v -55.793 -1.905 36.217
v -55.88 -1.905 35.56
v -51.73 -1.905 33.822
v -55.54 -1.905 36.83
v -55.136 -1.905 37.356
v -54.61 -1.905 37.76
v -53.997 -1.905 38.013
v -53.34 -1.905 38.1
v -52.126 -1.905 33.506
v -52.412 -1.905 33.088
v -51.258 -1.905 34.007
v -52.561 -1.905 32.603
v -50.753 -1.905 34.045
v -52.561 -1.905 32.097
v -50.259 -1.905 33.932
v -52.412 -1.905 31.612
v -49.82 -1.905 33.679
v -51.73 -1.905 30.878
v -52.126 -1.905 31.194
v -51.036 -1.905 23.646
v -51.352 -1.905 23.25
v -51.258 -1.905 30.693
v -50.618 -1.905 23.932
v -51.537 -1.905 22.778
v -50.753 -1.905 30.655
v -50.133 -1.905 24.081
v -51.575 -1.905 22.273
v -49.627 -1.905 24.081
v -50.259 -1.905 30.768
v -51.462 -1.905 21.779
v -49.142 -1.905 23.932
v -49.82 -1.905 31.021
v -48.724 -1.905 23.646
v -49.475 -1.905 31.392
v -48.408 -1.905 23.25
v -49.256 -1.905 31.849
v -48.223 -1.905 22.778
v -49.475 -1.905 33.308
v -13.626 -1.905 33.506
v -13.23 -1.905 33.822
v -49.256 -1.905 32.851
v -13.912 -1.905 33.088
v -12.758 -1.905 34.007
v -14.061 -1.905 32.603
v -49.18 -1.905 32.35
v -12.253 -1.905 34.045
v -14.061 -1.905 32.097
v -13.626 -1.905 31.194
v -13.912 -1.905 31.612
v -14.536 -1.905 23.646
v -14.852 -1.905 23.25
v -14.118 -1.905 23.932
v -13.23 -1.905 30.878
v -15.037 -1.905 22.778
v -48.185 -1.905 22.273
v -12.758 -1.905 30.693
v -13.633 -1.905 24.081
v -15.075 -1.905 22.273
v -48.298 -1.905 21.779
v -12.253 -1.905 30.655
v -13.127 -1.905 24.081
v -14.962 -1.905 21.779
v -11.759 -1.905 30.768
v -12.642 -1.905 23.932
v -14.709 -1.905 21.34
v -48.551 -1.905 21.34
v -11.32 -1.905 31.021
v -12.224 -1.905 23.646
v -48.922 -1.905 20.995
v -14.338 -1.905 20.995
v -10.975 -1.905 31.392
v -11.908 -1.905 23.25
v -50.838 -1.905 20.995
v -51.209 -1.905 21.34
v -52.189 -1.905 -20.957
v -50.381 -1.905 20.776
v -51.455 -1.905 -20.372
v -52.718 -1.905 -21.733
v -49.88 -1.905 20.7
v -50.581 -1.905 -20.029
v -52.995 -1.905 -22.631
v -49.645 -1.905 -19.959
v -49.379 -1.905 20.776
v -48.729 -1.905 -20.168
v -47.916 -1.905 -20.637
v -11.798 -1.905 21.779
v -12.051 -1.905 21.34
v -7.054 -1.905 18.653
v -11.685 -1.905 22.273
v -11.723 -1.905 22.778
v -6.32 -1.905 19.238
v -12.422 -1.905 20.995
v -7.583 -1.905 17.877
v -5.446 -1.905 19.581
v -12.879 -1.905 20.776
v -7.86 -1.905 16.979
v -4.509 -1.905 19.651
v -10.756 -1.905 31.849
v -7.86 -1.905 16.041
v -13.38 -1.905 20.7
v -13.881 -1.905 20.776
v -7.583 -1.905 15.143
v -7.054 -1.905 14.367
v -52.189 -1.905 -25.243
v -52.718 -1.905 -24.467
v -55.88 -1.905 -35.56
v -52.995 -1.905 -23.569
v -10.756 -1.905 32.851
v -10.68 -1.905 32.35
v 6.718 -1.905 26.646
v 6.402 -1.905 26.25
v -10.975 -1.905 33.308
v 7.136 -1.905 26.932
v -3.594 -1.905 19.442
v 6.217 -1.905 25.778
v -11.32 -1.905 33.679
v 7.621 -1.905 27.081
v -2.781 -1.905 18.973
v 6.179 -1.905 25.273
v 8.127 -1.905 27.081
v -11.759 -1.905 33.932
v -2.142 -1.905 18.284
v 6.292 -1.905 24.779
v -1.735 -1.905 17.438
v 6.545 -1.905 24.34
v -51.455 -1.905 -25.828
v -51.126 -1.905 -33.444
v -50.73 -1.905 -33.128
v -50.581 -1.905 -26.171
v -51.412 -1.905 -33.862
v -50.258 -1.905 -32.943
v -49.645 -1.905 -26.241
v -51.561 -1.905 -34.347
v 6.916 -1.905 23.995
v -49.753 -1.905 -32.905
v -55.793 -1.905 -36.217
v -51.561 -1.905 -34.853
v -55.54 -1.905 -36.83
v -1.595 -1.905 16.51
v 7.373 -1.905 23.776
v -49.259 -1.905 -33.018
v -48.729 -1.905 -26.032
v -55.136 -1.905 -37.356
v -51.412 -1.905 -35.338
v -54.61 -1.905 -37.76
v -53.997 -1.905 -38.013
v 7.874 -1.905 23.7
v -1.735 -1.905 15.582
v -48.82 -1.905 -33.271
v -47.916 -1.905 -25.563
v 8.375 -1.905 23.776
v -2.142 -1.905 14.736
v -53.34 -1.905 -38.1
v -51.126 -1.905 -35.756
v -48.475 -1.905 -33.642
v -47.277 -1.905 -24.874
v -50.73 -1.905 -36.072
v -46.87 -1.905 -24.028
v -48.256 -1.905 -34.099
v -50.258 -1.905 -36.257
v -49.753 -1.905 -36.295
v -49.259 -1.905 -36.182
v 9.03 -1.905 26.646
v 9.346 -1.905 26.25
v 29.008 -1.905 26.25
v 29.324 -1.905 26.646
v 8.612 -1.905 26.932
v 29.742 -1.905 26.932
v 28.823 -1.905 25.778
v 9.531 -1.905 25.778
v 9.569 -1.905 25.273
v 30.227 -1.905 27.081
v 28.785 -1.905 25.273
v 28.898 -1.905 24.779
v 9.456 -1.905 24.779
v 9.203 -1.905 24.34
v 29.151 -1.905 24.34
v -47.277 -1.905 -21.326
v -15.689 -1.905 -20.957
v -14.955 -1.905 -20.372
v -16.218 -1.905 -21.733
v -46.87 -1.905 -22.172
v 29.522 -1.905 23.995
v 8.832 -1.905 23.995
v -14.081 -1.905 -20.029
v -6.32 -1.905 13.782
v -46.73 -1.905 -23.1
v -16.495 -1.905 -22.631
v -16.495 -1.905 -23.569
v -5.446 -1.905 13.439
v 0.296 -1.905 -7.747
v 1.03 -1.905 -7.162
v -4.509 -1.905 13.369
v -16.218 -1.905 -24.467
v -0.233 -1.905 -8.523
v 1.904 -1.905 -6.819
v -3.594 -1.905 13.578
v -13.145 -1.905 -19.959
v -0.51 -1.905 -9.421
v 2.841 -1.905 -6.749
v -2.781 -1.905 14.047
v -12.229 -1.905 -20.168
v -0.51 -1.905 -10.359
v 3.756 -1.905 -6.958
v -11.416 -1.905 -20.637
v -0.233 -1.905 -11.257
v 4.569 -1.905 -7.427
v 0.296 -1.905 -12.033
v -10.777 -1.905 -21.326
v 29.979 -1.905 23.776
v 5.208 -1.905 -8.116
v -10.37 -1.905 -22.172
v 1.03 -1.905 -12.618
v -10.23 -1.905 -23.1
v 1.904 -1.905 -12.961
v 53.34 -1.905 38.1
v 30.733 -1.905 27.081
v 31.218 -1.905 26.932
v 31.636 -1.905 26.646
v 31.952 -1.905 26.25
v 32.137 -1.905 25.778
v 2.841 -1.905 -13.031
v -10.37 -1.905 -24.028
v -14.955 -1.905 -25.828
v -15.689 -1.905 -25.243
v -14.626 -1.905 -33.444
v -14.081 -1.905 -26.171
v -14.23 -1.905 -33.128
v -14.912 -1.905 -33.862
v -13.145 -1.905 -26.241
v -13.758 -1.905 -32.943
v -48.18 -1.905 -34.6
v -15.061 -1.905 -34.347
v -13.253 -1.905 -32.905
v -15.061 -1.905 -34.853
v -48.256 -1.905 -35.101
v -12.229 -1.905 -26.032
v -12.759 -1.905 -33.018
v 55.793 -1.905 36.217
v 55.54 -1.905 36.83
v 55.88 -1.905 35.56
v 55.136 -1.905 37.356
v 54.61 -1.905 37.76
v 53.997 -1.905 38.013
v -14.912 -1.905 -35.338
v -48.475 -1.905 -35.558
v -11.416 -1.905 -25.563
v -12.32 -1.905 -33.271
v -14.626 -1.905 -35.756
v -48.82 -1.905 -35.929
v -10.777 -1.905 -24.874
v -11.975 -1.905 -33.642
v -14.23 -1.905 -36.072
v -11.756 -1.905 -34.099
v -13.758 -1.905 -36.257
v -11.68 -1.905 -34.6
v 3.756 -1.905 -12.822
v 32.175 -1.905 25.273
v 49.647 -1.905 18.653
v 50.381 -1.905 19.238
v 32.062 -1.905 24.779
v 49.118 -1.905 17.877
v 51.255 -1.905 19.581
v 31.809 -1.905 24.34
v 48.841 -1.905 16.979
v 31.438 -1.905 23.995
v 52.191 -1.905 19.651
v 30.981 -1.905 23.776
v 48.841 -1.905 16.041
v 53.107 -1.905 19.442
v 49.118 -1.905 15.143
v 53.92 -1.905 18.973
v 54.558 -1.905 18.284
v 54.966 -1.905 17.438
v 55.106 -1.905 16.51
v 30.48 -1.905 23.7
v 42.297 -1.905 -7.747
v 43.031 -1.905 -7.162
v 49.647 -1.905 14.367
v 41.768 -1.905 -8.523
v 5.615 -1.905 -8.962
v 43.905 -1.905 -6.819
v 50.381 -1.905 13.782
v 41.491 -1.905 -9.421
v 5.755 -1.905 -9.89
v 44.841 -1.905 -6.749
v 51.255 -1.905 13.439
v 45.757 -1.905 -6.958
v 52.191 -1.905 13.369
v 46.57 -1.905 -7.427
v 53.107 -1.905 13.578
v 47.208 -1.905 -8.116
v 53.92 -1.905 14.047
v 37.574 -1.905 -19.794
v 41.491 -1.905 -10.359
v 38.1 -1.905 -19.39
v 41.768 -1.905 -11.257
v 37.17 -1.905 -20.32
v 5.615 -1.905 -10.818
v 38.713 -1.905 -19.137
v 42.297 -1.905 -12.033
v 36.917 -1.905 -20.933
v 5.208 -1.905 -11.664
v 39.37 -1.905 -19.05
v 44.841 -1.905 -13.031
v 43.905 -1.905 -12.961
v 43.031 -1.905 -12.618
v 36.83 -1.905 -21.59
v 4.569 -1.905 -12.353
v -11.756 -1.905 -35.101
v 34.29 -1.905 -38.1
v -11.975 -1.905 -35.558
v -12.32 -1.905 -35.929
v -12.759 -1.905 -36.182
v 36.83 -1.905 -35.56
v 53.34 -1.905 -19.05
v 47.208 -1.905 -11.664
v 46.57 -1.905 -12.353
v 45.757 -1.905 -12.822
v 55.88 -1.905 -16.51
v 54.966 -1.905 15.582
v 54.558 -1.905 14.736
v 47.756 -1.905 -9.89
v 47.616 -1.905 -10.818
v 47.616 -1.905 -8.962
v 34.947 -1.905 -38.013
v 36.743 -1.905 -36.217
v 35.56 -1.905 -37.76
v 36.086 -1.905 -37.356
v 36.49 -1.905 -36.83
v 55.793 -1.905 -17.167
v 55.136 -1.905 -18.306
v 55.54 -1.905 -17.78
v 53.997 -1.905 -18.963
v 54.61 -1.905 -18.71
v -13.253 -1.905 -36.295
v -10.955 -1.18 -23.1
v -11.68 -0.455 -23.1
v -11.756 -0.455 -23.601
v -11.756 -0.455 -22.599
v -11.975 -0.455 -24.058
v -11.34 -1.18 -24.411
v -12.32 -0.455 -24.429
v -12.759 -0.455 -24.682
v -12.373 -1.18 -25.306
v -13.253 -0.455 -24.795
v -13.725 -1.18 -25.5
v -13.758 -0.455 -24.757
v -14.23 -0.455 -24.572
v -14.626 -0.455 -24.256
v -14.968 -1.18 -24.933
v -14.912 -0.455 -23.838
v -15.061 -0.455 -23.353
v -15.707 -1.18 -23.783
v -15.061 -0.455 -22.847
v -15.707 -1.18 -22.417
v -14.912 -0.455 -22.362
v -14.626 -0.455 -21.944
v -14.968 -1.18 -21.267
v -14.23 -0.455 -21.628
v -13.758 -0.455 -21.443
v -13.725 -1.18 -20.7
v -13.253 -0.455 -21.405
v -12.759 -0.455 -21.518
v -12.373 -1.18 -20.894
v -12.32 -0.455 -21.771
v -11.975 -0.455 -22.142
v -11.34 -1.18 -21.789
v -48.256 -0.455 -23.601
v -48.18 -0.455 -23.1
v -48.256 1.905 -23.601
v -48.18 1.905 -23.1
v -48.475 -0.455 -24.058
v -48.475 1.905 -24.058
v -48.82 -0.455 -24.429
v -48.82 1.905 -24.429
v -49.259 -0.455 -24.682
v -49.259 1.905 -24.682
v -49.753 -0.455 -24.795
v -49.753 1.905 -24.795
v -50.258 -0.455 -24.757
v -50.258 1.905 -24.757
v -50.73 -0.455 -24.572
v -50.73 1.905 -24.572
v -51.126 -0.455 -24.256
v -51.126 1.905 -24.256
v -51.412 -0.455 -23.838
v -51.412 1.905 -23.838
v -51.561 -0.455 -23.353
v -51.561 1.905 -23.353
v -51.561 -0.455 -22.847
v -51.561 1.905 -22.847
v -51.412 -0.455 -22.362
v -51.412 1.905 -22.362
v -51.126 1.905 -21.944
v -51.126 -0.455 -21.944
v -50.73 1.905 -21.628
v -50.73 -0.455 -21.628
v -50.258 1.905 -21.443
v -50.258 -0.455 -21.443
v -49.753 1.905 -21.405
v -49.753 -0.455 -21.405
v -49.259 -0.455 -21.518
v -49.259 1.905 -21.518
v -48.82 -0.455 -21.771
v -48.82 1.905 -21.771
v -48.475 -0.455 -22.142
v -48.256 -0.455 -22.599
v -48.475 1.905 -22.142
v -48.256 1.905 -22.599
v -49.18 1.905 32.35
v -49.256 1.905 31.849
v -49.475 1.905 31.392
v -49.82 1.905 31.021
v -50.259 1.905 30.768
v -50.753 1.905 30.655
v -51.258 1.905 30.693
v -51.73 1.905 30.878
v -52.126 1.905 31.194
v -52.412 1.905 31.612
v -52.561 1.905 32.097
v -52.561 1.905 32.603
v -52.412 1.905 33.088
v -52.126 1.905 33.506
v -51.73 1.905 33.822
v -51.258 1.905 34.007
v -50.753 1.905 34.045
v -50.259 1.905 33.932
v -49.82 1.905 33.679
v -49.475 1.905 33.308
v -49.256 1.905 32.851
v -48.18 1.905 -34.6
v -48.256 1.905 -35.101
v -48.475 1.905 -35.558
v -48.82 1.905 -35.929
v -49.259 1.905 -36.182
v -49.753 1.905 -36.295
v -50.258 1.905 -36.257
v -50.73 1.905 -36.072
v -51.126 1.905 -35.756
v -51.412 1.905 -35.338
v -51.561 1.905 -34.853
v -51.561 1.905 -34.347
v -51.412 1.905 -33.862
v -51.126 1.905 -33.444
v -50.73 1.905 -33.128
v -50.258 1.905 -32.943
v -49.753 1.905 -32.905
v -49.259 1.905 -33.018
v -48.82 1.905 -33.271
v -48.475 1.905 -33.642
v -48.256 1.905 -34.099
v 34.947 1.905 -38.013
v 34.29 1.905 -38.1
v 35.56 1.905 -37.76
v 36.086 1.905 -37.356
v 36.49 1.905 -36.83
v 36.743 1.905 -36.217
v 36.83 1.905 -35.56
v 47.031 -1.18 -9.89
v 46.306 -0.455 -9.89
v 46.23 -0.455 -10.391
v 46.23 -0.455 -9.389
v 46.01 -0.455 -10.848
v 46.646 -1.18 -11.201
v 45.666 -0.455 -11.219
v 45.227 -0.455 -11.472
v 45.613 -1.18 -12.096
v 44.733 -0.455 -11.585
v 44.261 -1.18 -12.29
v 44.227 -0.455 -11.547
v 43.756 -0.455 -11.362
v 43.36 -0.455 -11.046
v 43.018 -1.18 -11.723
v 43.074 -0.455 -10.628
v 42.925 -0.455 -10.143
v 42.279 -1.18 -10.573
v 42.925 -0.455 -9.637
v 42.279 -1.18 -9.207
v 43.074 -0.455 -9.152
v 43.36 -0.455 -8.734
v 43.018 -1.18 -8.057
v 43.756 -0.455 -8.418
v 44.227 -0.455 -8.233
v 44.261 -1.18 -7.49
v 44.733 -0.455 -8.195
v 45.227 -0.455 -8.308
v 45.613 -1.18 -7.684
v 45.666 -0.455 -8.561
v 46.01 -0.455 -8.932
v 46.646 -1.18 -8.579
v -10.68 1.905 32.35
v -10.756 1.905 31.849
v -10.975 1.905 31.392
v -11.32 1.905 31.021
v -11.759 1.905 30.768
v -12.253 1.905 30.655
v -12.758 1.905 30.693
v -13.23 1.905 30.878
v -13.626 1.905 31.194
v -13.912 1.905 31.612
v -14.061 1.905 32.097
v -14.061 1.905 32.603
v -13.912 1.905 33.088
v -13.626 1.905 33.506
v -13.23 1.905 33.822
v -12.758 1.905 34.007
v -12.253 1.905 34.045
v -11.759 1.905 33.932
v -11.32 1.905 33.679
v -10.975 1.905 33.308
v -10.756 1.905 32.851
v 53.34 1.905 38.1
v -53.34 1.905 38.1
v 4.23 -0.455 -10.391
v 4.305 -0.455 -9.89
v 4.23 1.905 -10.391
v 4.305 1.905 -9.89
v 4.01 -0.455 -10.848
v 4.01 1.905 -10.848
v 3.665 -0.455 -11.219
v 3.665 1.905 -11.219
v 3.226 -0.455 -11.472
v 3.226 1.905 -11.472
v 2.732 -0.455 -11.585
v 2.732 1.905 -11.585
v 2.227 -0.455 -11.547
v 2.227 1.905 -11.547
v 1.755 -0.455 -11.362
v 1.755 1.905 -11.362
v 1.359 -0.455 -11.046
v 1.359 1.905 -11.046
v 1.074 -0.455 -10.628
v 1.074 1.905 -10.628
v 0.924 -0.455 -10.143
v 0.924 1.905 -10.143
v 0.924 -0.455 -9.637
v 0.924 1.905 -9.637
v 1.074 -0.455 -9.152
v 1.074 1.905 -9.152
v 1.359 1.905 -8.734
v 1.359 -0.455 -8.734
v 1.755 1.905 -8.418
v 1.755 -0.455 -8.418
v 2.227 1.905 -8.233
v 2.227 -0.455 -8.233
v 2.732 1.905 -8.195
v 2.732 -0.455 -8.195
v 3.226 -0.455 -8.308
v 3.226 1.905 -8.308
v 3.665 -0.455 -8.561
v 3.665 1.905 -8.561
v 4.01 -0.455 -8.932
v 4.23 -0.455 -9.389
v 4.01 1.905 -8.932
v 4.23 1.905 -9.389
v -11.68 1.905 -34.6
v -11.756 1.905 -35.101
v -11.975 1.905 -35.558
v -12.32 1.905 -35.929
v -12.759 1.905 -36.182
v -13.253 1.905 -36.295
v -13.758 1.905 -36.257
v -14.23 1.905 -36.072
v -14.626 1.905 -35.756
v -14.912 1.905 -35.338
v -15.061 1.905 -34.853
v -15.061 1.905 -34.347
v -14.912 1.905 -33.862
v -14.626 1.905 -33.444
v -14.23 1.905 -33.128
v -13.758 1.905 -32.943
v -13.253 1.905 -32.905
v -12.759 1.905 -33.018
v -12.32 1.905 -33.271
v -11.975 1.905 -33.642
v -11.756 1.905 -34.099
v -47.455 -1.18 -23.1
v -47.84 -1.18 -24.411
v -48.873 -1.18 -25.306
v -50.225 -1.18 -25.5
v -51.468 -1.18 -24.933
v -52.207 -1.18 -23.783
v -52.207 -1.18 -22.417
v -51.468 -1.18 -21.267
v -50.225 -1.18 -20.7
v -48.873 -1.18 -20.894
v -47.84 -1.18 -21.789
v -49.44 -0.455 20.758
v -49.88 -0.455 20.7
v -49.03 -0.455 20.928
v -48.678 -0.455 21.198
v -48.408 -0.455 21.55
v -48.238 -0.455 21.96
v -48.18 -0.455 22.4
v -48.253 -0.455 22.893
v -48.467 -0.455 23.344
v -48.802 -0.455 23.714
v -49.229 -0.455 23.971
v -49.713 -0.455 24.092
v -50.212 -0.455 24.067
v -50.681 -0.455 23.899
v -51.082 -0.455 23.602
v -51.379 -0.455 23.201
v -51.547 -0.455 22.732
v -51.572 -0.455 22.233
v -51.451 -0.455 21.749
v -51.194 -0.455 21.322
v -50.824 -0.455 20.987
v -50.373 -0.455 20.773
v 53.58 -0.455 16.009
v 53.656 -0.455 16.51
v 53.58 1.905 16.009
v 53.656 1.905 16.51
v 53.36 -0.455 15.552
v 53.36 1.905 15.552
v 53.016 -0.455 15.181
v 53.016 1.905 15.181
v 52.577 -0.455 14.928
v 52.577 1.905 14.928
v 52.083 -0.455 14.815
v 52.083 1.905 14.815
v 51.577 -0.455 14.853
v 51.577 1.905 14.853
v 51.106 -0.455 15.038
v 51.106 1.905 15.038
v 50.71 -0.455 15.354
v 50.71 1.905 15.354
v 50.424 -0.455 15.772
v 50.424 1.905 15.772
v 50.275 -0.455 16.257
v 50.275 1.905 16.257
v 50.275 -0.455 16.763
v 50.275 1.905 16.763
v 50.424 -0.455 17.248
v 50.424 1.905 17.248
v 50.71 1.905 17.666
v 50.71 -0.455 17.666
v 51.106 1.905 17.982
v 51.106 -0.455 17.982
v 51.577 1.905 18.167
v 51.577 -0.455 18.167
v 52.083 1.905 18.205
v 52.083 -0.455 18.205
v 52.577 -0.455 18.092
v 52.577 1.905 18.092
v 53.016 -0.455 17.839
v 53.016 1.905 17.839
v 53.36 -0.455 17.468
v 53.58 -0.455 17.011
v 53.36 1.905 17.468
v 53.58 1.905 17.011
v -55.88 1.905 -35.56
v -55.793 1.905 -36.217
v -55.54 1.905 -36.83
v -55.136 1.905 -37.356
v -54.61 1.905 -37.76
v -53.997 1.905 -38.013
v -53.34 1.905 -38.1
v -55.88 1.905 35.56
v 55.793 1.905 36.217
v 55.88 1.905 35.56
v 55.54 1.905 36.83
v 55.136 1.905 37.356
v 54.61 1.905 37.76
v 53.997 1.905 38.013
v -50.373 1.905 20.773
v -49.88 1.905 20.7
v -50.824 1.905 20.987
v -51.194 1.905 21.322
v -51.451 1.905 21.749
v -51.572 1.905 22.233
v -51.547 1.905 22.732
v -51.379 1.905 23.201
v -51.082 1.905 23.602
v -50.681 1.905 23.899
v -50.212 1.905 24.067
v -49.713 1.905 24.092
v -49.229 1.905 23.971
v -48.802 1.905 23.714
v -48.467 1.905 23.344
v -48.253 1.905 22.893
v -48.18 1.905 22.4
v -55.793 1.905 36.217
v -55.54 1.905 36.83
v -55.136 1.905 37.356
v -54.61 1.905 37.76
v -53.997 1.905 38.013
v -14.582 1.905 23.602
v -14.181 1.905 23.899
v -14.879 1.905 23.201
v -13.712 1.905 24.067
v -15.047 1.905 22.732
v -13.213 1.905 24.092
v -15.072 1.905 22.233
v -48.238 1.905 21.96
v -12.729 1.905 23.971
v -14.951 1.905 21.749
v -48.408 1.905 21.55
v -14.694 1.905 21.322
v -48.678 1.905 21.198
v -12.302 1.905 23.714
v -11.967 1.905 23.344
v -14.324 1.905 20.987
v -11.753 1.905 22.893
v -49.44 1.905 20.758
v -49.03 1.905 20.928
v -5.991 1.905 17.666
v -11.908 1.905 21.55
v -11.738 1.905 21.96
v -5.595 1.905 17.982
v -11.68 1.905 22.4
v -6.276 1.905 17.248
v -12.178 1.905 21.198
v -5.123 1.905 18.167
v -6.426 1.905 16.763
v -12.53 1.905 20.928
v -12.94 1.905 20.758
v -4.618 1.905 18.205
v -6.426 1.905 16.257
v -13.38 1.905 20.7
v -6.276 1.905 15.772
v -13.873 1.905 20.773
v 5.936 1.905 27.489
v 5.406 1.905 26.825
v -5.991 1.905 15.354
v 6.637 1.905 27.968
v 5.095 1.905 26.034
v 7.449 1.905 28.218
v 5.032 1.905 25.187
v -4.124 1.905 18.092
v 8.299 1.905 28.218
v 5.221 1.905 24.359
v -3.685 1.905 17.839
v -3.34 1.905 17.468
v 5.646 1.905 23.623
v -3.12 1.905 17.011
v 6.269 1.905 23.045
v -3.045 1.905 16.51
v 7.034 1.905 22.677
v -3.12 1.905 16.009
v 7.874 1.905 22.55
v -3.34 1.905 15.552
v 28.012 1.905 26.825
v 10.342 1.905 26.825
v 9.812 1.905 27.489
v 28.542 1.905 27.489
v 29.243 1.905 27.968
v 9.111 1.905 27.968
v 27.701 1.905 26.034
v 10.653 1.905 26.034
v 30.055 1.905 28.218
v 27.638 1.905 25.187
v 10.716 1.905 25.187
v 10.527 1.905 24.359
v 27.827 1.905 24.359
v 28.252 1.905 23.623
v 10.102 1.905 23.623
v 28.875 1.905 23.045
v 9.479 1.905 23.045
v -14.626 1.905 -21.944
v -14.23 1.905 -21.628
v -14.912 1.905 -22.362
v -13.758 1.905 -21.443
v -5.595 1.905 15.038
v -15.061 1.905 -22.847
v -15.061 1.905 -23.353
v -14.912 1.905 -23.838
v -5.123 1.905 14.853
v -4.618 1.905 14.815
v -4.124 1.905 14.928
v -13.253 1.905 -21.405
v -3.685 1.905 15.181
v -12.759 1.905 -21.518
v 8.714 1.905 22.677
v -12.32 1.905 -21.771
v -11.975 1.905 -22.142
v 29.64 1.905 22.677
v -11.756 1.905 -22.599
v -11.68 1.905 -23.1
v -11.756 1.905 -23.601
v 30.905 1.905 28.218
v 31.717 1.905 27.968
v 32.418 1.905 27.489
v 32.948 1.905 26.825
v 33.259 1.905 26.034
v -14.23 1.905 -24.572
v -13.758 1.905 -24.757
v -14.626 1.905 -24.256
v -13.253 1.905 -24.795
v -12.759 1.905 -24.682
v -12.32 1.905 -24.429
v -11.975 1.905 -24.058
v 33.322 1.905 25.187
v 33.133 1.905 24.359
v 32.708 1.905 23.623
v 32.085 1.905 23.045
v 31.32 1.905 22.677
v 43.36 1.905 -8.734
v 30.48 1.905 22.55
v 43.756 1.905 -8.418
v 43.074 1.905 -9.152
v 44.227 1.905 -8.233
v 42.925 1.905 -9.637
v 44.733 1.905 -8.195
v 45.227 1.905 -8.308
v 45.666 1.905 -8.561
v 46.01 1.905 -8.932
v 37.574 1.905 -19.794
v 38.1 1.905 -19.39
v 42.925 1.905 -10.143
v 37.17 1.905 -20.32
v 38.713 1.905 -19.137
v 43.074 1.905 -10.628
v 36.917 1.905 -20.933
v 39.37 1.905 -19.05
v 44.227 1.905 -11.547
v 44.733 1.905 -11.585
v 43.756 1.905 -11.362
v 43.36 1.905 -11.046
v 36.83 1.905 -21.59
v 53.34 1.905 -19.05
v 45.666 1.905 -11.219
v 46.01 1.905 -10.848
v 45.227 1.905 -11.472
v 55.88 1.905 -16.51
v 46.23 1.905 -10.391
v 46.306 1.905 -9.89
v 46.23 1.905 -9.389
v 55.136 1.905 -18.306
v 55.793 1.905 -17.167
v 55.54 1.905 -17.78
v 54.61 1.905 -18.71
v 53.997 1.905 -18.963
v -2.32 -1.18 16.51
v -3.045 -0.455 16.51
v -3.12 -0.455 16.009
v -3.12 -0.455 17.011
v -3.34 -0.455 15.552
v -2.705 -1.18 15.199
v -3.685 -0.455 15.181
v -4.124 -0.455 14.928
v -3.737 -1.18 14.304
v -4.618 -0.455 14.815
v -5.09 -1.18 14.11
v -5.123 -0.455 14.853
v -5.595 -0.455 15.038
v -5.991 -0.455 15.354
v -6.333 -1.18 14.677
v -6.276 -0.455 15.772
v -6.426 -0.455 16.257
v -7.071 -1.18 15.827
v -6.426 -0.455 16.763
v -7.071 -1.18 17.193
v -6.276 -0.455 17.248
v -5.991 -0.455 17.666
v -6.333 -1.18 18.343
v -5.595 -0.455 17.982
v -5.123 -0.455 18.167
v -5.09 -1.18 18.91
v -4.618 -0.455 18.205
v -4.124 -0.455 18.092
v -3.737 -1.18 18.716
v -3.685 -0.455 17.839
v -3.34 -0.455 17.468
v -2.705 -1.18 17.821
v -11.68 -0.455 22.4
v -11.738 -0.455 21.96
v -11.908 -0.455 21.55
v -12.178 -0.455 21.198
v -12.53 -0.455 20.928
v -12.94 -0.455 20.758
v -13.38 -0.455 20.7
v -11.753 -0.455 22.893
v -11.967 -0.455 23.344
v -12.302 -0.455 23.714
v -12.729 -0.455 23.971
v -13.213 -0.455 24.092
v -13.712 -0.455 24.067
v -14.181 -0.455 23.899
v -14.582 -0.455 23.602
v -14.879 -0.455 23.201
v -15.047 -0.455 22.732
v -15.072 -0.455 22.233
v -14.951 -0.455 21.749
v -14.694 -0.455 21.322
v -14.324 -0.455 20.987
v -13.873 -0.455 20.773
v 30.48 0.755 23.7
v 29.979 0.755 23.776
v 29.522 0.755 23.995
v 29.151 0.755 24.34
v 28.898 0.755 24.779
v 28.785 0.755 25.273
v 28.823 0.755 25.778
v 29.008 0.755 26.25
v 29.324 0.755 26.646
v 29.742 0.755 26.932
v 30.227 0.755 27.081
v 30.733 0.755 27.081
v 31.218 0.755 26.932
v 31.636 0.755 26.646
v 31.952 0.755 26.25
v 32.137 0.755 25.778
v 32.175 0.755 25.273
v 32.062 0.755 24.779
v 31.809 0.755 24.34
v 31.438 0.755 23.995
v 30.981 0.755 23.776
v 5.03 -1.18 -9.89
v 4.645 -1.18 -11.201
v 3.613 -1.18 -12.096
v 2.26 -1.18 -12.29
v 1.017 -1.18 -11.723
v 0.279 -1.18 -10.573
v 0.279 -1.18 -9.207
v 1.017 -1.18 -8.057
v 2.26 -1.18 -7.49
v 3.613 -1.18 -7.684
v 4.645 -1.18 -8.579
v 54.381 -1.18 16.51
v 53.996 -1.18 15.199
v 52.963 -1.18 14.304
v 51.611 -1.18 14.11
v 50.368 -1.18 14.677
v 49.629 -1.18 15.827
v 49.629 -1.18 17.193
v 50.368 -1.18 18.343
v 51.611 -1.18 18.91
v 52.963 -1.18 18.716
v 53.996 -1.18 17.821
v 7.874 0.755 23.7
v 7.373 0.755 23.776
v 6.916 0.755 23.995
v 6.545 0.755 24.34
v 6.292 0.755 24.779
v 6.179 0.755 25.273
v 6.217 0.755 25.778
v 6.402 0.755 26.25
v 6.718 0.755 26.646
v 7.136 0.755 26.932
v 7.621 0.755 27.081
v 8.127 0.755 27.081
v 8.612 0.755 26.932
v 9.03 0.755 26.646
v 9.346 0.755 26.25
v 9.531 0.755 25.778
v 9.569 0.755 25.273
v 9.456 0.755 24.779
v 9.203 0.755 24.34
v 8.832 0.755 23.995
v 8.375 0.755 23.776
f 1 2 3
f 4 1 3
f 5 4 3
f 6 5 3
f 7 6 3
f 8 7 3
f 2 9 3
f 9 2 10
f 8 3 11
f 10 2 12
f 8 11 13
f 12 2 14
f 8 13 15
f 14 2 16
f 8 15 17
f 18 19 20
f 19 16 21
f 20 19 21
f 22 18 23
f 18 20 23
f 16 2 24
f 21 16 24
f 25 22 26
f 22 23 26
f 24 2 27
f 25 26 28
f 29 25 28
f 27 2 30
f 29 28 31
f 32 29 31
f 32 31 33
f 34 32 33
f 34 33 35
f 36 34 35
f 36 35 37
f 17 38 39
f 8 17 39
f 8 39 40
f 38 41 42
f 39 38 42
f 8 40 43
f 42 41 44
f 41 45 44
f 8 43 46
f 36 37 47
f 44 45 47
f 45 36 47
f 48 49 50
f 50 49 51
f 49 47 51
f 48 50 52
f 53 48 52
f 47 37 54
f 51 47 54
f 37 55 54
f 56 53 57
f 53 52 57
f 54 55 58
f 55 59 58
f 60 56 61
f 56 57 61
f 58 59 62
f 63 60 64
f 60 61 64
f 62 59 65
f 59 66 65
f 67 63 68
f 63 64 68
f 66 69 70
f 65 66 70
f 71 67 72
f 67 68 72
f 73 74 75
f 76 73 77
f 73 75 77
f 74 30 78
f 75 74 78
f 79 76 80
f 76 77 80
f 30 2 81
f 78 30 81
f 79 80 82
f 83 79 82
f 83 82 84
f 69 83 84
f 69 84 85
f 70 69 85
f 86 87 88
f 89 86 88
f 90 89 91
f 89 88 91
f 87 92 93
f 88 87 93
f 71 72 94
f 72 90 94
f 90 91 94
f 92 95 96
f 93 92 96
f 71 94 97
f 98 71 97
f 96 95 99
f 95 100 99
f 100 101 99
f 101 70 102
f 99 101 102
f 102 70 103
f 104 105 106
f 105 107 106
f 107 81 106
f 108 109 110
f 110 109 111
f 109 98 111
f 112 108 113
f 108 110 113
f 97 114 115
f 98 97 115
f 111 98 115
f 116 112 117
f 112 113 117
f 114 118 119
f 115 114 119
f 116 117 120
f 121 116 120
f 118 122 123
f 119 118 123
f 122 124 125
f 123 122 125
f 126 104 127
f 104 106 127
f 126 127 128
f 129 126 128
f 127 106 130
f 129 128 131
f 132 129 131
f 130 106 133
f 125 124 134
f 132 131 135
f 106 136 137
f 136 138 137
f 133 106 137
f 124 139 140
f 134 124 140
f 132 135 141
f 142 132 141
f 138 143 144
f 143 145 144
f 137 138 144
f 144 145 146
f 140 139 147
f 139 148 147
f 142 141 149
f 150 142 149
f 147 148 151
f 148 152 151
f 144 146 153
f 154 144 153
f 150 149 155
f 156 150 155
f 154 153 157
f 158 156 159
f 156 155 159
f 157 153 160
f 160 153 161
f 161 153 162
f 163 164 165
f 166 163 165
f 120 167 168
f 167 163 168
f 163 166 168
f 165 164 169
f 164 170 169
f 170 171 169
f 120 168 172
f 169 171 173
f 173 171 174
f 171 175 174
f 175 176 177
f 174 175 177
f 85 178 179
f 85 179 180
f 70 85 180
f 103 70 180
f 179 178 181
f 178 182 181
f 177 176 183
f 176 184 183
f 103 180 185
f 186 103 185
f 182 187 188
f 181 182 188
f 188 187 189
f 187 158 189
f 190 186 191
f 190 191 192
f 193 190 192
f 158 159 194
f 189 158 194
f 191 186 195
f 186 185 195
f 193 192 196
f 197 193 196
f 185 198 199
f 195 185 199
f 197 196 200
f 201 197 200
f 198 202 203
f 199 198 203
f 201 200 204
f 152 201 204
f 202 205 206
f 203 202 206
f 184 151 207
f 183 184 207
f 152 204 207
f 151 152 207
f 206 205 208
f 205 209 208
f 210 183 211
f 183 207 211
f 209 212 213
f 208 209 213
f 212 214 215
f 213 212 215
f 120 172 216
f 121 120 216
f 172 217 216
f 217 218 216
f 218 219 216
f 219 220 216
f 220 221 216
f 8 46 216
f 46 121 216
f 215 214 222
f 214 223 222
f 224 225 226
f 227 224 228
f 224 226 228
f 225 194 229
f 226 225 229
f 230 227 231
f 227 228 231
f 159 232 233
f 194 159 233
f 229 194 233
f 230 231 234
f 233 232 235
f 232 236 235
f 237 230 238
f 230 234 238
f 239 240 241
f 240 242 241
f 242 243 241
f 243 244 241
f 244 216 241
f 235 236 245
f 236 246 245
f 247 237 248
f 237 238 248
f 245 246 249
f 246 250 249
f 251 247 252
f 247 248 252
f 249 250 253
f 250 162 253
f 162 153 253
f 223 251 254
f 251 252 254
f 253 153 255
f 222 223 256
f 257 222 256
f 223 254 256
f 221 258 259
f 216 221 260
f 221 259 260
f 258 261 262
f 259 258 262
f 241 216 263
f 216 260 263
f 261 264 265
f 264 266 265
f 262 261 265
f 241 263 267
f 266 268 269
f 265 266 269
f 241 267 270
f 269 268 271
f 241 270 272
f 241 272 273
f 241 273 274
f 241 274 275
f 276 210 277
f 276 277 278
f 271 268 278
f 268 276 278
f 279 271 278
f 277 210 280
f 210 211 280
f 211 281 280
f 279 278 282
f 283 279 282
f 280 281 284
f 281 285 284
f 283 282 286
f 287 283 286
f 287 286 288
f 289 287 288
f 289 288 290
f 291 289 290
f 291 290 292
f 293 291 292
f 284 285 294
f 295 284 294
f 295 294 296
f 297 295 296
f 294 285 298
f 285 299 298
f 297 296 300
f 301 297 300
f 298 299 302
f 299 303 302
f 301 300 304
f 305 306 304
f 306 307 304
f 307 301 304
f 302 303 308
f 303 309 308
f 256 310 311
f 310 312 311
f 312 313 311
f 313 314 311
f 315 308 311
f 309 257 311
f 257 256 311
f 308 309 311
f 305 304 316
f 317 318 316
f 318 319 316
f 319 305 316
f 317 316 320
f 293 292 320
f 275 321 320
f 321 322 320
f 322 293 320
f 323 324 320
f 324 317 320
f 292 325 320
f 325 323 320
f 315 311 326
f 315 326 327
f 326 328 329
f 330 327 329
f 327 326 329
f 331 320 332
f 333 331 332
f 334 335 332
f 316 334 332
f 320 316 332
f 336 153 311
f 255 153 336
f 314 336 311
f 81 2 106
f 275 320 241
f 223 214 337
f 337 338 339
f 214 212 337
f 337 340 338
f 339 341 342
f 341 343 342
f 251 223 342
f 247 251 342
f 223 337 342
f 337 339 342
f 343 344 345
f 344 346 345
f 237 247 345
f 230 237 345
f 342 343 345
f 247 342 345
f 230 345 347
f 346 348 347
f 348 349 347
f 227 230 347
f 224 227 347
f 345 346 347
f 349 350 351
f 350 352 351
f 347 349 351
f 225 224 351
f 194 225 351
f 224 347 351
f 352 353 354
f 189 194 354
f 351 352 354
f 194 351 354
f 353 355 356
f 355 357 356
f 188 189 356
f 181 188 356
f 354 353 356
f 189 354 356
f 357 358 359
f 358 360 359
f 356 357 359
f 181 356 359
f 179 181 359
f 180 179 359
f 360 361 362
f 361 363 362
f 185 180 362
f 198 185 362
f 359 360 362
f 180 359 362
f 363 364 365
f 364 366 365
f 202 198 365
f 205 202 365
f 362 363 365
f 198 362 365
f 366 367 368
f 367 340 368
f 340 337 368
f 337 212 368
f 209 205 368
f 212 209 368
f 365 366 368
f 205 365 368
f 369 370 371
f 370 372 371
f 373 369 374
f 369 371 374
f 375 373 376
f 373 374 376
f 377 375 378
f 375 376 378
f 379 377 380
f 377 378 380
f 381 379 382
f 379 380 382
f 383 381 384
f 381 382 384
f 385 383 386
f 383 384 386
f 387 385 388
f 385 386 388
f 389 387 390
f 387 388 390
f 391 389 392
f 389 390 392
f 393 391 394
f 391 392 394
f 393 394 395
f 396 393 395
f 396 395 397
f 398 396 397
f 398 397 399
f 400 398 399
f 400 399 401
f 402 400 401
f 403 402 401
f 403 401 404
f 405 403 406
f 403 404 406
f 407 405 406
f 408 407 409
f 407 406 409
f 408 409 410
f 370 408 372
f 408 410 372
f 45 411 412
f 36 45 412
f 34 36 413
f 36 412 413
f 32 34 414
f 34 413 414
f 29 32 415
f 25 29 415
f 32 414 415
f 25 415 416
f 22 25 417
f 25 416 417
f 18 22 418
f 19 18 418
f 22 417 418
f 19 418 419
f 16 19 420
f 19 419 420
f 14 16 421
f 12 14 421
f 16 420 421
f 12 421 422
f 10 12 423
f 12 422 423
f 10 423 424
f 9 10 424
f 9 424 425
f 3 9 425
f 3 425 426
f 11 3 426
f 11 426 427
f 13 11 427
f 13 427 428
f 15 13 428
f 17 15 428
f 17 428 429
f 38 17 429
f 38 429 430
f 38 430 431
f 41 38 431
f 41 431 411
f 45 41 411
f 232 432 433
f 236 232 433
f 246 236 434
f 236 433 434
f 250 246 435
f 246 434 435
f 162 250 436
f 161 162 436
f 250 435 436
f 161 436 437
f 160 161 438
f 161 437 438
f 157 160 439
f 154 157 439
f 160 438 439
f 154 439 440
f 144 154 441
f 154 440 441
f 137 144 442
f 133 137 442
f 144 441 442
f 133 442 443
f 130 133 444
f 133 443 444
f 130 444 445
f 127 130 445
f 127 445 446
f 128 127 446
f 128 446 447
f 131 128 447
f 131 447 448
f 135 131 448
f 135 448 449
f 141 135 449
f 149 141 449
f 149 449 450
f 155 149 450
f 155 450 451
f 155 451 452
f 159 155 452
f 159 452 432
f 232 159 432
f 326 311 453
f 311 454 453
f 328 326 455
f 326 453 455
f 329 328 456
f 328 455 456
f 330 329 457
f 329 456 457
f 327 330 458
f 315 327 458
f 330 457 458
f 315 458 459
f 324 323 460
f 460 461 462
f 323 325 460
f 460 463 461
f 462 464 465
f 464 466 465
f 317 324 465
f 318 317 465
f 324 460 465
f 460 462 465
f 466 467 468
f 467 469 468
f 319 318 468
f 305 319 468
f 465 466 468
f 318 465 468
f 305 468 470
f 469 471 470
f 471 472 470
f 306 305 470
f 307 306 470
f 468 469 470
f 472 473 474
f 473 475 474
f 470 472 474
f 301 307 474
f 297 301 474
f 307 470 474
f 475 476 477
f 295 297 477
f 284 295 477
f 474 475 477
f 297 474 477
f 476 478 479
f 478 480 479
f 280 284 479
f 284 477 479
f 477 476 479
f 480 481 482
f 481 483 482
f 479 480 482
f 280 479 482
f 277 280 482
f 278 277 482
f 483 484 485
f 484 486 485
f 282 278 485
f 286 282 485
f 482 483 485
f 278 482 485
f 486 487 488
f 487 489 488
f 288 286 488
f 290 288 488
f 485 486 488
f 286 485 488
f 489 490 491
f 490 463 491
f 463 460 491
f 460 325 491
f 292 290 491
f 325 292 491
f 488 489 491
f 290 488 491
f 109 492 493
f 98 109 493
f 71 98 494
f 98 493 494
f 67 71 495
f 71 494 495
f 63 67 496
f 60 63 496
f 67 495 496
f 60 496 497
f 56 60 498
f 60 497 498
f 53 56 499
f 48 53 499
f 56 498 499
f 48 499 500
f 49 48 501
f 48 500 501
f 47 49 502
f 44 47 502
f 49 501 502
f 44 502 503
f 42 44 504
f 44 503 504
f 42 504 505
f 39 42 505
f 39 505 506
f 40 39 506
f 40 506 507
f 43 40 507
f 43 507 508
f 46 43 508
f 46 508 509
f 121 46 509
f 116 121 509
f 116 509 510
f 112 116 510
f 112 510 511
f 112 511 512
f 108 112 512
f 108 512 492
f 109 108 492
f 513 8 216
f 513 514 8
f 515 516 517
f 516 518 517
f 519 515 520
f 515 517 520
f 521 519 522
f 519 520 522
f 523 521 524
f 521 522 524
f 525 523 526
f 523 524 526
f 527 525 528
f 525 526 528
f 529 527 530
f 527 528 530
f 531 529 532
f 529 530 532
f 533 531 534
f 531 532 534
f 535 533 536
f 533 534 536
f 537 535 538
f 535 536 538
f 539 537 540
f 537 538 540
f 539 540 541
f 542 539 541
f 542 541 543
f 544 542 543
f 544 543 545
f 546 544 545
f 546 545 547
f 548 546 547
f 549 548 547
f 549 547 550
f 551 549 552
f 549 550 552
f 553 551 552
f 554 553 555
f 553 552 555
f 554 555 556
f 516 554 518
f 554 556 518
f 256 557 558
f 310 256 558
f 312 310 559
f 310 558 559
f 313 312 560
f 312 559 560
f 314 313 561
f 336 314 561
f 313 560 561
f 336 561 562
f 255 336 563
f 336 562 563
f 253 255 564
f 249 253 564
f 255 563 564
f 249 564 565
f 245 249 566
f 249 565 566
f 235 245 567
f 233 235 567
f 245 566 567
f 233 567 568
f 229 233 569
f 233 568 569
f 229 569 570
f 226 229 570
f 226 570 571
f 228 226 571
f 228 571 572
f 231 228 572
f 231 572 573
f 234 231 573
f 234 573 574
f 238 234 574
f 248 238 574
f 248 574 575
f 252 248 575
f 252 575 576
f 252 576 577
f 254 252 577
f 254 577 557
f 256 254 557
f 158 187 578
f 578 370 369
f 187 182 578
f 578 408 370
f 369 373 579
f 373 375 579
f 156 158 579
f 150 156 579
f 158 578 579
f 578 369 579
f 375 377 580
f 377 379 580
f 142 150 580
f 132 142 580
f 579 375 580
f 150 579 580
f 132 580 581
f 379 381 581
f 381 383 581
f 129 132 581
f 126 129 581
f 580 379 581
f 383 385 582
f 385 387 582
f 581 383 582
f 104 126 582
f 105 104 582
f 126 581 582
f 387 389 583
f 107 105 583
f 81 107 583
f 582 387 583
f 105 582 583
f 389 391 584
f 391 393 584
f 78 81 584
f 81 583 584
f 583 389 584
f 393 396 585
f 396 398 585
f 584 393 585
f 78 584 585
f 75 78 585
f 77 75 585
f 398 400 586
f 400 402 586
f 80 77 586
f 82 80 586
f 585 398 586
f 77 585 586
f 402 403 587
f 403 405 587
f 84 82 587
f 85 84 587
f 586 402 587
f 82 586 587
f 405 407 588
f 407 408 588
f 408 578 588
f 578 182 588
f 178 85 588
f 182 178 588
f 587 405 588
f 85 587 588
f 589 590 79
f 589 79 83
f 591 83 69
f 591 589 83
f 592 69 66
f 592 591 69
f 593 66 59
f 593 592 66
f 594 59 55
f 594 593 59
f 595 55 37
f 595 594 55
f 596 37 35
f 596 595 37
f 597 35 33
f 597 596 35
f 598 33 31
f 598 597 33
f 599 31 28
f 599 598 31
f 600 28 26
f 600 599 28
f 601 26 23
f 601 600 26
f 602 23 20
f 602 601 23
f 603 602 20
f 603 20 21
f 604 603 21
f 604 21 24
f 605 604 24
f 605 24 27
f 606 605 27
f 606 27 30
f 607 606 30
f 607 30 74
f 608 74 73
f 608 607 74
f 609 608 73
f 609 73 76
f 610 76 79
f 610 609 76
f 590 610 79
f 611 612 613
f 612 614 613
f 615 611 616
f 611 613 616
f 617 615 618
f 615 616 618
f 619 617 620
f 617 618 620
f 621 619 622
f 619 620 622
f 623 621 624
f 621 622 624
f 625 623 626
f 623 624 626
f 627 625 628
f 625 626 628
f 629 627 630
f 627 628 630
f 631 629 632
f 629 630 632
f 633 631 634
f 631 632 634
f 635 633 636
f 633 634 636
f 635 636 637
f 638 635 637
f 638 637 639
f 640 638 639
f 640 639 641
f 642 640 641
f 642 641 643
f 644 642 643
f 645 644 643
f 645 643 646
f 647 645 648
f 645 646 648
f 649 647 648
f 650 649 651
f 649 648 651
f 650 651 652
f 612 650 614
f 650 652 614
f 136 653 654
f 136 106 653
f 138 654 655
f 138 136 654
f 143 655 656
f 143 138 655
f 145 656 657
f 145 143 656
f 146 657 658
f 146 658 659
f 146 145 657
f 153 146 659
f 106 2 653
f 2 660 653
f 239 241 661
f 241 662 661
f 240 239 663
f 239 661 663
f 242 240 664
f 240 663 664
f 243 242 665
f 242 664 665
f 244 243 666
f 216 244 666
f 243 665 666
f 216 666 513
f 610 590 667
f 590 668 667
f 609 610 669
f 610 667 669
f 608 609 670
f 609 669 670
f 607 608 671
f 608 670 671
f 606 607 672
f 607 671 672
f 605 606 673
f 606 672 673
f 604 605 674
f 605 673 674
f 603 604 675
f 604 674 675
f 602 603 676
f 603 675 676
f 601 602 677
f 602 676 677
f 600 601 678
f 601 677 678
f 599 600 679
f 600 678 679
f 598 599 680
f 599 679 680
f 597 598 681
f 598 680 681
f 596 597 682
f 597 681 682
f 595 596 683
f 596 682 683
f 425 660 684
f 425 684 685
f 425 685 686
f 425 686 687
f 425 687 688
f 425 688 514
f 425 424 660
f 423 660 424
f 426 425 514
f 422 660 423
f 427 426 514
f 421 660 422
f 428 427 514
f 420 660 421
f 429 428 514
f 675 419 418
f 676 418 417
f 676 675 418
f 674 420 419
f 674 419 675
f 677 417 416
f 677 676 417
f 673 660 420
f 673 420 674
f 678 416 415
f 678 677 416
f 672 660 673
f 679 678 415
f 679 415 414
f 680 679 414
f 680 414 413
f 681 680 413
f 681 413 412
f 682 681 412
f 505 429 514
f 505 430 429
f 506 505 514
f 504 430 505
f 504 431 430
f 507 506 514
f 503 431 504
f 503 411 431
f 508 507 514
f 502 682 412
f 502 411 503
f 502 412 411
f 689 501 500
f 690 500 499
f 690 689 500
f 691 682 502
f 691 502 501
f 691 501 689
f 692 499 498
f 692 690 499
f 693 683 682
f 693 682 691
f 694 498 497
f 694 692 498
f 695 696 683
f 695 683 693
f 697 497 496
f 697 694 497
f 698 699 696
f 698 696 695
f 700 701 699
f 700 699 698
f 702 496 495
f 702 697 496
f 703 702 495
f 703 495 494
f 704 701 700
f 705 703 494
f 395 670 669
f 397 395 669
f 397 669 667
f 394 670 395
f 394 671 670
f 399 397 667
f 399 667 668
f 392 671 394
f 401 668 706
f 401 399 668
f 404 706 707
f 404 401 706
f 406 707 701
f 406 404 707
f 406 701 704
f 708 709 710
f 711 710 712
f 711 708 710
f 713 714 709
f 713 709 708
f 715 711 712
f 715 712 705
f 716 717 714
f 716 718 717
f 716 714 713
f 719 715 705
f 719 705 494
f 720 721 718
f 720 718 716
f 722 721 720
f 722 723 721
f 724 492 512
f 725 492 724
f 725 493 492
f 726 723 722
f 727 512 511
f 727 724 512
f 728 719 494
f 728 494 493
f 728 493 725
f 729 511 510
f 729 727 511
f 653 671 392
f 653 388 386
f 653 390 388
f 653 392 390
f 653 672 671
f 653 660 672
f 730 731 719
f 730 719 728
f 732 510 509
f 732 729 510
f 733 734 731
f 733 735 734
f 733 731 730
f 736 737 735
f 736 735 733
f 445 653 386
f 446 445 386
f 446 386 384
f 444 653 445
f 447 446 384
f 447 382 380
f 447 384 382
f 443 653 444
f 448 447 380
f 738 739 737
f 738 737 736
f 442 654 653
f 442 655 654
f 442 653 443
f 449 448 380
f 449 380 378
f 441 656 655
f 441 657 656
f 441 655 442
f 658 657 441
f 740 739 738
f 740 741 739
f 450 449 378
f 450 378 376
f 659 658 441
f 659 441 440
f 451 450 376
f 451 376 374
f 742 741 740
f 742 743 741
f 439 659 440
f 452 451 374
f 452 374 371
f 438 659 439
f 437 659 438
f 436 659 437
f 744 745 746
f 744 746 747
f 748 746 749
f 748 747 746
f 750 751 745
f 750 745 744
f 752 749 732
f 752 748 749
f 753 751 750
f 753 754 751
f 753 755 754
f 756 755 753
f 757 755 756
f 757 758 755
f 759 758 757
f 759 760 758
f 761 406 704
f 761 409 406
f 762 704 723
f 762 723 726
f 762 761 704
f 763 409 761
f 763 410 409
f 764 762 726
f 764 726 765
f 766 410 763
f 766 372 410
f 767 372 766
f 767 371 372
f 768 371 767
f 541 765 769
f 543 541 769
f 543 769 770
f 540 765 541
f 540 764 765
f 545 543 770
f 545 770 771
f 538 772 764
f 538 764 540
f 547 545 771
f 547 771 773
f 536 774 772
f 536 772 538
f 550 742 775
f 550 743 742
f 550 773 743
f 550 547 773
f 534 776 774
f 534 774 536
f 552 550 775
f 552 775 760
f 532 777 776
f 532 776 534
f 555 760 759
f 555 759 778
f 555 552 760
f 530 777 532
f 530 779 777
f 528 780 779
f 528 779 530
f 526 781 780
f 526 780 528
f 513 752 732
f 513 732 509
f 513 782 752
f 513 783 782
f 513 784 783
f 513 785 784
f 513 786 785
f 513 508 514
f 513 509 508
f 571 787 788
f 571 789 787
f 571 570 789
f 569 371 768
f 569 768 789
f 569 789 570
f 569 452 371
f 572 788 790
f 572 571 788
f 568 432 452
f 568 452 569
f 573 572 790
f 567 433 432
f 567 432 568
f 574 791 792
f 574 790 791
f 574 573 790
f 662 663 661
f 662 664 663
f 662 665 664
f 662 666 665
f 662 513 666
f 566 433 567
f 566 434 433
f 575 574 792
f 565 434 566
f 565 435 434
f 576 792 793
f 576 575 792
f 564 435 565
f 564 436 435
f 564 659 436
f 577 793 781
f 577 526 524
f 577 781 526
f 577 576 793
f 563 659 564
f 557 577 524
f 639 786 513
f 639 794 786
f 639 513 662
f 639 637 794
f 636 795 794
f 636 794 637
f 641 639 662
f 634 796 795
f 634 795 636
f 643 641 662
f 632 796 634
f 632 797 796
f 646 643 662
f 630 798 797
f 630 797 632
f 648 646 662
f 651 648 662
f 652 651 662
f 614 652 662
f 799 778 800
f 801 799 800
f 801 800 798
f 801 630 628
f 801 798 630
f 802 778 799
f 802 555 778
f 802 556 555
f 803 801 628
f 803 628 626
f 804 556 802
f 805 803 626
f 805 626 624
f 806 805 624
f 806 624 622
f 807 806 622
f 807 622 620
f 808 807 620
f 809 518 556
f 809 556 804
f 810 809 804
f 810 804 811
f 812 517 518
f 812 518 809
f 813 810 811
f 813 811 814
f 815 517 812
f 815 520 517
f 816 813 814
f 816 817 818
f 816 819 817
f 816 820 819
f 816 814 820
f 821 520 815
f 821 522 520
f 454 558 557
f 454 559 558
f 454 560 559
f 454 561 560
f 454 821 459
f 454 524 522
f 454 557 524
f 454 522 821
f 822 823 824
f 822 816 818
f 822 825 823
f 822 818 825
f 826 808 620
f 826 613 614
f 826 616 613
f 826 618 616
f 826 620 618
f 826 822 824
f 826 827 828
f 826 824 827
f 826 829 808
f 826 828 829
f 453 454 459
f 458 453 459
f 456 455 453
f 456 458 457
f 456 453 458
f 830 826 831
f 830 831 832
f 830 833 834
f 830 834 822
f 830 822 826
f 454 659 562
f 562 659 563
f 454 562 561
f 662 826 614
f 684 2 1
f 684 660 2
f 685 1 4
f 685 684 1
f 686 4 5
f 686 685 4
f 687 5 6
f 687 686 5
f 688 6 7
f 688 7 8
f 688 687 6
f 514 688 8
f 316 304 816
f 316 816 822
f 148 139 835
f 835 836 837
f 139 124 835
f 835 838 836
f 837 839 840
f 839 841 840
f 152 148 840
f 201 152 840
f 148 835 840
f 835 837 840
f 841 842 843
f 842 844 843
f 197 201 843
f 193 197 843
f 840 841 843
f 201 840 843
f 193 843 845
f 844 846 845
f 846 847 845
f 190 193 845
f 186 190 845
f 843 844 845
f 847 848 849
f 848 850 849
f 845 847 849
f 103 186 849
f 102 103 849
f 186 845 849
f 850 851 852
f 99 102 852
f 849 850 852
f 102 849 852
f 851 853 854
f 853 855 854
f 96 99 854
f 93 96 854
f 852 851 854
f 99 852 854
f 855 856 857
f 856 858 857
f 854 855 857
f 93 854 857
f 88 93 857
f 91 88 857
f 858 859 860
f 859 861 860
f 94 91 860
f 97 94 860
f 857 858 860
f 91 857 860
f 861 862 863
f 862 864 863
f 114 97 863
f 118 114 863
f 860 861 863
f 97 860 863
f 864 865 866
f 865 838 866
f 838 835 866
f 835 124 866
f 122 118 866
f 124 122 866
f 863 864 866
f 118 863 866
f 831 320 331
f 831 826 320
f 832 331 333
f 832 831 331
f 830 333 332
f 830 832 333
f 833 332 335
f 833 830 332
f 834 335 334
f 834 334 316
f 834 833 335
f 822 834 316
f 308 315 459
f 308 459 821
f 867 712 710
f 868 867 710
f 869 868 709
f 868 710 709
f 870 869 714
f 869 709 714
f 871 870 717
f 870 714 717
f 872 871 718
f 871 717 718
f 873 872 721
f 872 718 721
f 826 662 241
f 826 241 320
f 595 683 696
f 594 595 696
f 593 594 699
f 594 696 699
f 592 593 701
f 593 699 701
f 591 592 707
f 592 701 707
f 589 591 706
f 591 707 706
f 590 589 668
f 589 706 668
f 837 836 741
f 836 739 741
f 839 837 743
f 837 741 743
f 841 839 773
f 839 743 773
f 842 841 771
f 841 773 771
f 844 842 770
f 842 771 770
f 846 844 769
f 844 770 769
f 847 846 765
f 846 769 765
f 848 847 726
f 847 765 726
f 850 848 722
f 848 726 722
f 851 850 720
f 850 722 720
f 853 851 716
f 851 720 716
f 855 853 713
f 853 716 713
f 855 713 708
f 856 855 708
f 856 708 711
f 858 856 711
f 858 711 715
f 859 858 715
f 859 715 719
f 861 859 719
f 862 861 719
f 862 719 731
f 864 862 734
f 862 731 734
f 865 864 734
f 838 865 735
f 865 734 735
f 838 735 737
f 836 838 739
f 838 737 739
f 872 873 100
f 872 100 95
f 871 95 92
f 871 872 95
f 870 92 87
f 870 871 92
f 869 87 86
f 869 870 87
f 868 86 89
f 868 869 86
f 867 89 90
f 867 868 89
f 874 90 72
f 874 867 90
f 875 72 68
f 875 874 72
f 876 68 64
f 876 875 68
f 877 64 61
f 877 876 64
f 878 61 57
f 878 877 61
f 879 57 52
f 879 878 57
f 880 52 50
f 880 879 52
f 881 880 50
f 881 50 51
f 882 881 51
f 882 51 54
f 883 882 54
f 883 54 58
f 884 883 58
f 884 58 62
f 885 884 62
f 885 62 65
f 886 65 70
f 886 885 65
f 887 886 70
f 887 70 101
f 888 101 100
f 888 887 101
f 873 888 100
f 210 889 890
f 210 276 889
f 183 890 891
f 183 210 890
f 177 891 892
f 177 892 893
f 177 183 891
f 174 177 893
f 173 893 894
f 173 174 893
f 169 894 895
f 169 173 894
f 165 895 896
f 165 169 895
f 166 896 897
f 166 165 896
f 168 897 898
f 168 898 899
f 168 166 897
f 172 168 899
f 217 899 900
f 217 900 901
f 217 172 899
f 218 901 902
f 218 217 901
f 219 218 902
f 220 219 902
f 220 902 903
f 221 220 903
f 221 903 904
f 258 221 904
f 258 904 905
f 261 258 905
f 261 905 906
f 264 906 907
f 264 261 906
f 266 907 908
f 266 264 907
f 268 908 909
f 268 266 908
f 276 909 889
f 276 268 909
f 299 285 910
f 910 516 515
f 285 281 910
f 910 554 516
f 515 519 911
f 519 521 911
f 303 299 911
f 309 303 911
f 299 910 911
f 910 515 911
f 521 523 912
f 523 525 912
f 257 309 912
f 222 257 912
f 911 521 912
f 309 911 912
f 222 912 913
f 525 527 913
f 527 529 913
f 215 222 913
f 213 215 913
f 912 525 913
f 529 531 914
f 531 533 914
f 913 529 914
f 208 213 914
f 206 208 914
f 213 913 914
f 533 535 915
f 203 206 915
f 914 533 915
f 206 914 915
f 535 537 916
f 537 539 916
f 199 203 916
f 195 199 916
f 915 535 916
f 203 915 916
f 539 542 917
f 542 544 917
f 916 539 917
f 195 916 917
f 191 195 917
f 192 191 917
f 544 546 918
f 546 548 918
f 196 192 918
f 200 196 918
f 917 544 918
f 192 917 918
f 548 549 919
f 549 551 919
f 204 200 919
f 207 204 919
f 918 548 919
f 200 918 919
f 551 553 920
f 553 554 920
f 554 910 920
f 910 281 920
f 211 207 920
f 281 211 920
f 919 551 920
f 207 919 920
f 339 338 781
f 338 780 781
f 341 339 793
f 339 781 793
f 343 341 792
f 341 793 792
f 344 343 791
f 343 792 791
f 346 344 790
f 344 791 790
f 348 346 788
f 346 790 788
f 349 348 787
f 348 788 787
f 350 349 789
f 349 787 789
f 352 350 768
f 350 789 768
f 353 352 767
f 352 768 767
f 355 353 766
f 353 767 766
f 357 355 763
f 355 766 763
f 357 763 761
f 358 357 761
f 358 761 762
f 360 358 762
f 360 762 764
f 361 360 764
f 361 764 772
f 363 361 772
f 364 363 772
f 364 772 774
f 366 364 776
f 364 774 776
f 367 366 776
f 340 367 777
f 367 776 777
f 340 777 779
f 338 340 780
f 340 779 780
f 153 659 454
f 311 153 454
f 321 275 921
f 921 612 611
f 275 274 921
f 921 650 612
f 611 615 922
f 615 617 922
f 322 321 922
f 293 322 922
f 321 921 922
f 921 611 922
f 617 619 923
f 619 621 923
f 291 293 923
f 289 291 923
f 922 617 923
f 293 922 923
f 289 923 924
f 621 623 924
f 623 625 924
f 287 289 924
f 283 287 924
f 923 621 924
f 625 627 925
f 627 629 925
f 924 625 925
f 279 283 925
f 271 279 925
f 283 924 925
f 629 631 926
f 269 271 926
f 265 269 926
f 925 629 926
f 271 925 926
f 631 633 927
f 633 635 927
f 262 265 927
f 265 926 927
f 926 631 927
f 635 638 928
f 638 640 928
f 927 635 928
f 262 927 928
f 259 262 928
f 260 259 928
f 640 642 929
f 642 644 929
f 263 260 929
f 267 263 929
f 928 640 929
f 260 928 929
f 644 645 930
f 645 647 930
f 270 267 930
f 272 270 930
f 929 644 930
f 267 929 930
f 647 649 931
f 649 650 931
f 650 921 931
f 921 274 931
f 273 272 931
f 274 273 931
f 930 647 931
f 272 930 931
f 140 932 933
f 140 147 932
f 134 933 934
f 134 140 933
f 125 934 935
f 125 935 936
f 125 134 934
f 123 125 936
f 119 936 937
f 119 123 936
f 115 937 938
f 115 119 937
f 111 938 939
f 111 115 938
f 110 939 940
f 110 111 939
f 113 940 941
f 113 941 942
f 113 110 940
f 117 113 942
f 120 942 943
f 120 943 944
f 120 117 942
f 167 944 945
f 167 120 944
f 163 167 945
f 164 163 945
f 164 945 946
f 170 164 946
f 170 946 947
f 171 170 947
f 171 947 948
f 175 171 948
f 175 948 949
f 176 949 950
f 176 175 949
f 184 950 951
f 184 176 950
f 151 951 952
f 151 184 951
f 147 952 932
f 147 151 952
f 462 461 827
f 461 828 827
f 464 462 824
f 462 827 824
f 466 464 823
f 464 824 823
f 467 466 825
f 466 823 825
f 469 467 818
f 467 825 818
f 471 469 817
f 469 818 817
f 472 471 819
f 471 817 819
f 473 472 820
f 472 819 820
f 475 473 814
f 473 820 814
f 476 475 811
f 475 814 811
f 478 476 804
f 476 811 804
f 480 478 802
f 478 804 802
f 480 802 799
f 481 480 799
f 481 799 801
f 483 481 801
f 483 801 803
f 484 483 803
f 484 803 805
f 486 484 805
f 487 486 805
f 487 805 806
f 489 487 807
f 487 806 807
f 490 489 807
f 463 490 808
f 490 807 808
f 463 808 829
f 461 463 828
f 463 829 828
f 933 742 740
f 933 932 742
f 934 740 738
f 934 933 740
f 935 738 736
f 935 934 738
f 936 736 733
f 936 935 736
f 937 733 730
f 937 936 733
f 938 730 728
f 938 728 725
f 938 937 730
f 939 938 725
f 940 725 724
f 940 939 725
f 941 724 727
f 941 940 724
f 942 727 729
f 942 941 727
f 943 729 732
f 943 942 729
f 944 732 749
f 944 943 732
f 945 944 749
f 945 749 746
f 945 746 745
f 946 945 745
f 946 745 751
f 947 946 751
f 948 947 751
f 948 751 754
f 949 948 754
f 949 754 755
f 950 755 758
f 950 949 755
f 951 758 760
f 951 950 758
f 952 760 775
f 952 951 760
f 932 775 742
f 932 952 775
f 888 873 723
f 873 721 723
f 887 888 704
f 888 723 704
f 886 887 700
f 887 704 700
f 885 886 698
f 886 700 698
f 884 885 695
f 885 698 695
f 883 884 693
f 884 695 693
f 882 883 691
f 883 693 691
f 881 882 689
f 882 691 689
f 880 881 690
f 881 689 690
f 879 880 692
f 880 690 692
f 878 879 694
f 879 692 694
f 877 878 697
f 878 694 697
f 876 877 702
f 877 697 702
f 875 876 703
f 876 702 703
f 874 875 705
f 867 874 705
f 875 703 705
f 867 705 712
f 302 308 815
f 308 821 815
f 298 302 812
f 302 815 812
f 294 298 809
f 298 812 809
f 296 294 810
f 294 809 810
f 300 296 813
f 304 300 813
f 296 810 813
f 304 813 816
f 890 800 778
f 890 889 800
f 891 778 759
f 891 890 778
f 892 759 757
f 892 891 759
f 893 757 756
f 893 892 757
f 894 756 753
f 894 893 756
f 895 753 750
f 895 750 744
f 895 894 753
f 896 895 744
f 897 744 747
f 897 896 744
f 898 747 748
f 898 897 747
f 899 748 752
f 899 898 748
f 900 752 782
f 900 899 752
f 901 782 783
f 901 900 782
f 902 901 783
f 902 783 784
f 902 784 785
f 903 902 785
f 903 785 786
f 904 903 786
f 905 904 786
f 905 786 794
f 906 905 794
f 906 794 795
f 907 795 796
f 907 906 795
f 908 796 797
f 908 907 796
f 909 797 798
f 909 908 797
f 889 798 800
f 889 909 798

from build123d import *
from build123d.topology import SkipClean

# Parameters (mm, degrees)
SKETCH1_W                                       = 111.76
SKETCH1_H                                       = 76.2
BOSS_EXTRUDE1_DEPTH                             = 1.905
FILLET1_R                                       = 2.54
M3_CLEARANCE_HOLE4_D                            = 3.4
CSK_FOR_M3_FLAT_HEAD_MACHINE_SCREW1_D           = 3.4
CSK_FOR_M3_FLAT_HEAD_MACHINE_SCREW1_CSINK_D     = 6.3
CSK_FOR_M3_FLAT_HEAD_MACHINE_SCREW1_CSINK_ANGLE = 90
CSK_FOR_M3_FLAT_HEAD_MACHINE_SCREW2_D           = 3.4
CSK_FOR_M3_FLAT_HEAD_MACHINE_SCREW2_CSINK_D     = 6.3
CSK_FOR_M3_FLAT_HEAD_MACHINE_SCREW2_CSINK_ANGLE = 90
BOSS_EXTRUDE2_START                             = -3.81
SKETCH23_R                                      = 3.15
SKETCH23_R_2                                    = 1.7
BOSS_EXTRUDE2_DEPTH                             = 3.81
SKETCH12_W                                      = 28.355545758
SKETCH12_H                                      = 25.387795591
CUT_EXTRUDE1_DEPTH                              = 68.739947594
M3_CLEARANCE_HOLE1_AT_2_COUNT                   = 2
M3_CLEARANCE_HOLE1_AT_2_PITCH                   = 22.606
FILLET2_R                                       = 2.54


with BuildPart() as part:
    # Sketch1 → Boss-Extrude1 (new, symmetric)
    with BuildSketch(Plane(origin=(0, 0, 0), x_dir=(1, 0, 0), z_dir=(0, 1, 0))):
        Rectangle(SKETCH1_W, SKETCH1_H)
    extrude(amount=BOSS_EXTRUDE1_DEPTH, both=True)

    # Fillet1
    fillet1_edges = [part.edges().sort_by_distance(p)[0] for p in [
        (55.88, 0, 38.1),
        (-55.88, 0, 38.1),
        (-55.88, 0, -38.1),
        (55.88, 0, -38.1),
    ]]
    fillet(fillet1_edges, radius=FILLET1_R)

    # M3 Clearance Hole4 (through all)
    with Locations(Plane(origin=(0, -1.905, 0), x_dir=(-1, 0, 0), z_dir=(0, -1, 0))):
        with Locations((13.38, 34.6), (49.88, 34.6), (50.88, -32.35), (12.38, -32.35)):
            Hole(M3_CLEARANCE_HOLE4_D / 2)

    # CSK for M3 Flat Head Machine Screw1 (through all)
    with Locations(Plane(origin=(0, -1.905, 0), x_dir=(-1, 0, 0), z_dir=(0, -1, 0))):
        with Locations((-51.9557, -16.51), (4.74472, -16.51), (-44.6057, 9.89), (-2.60528, 9.89)):
            CounterSinkHole(CSK_FOR_M3_FLAT_HEAD_MACHINE_SCREW1_D / 2, CSK_FOR_M3_FLAT_HEAD_MACHINE_SCREW1_CSINK_D / 2, counter_sink_angle=CSK_FOR_M3_FLAT_HEAD_MACHINE_SCREW1_CSINK_ANGLE)

    # CSK for M3 Flat Head Machine Screw2 (through all)
    with Locations(Plane(origin=(0, -1.905, 0), x_dir=(-1, 0, 0), z_dir=(0, -1, 0))):
        with Locations((49.88, 23.1), (49.88, -22.4), (13.38, 23.1), (13.38, -22.4)):
            CounterSinkHole(CSK_FOR_M3_FLAT_HEAD_MACHINE_SCREW2_D / 2, CSK_FOR_M3_FLAT_HEAD_MACHINE_SCREW2_CSINK_D / 2, counter_sink_angle=CSK_FOR_M3_FLAT_HEAD_MACHINE_SCREW2_CSINK_ANGLE)

    # Sketch23 → Boss-Extrude2 (add)
    # profile 1 of 2: a face of its own
    with SkipClean():  # the faces are left unmerged after this step: merging them gives an invalid solid
        with BuildSketch(Plane.XZ.offset(1.905).offset(BOSS_EXTRUDE2_START)):
            with Locations((-13.38, 22.4)):
                Circle(SKETCH23_R)
            with Locations(Location((-13.38, 22.4, 0), (0, 0, 270))):
                Circle(SKETCH23_R_2, mode=Mode.SUBTRACT)
        # profile 2 of 2: a face of its own
        with BuildSketch(Plane.XZ.offset(1.905).offset(BOSS_EXTRUDE2_START)):
            with Locations((-49.88, 22.4)):
                Circle(SKETCH23_R)
            with Locations(Location((-49.88, 22.4, 0), (0, 0, 270))):
                Circle(SKETCH23_R_2, mode=Mode.SUBTRACT)
        extrude(amount=BOSS_EXTRUDE2_DEPTH)

    # Sketch12 → Cut-Extrude1 (cut, through all)
    with SkipClean():  # the faces are left unmerged after this step: merging them gives an invalid solid
        with BuildSketch(Plane.XZ.offset(1.905)):
            with Locations((51.007772879, -31.743897796)):
                Rectangle(SKETCH12_W, SKETCH12_H)
        extrude(amount=-CUT_EXTRUDE1_DEPTH, mode=Mode.SUBTRACT)

    # Sketch16 → M3 Clearance Hole1 (revolve, cut)
    with SkipClean():  # the faces are left unmerged after this step: merging them gives an invalid solid
        with BuildSketch(Plane(origin=(30.48, -1.905, 25.4), x_dir=(0, 0, -1), z_dir=(1, 0, 0))):
            Polygon((0, 0), (0, 3.81), (2.85, 3.81), (1.7, 2.66), (1.7, 0), align=None)
        m3_clearance_hole1 = revolve(axis=Axis((30.48, -8.255, 25.4), (0, 1, 0)), mode=Mode.SUBTRACT)

    # M3 Clearance Hole1 at 2: M3 Clearance Hole1 ×2
    with SkipClean():  # the faces are left unmerged after this step: merging them gives an invalid solid
        with Locations(*[(-i * M3_CLEARANCE_HOLE1_AT_2_PITCH, 0, 0) for i in range(1, M3_CLEARANCE_HOLE1_AT_2_COUNT)]):
            add(m3_clearance_hole1, mode=Mode.SUBTRACT)

    # Fillet2
    fillet2_edges = [part.edges().sort_by_distance(p)[0] for p in [
        (36.83, 0, -38.1),
        (55.88, 0, -19.05),
        (36.83, 0, -19.05),
    ]]
    fillet(fillet2_edges, radius=FILLET2_R)


solid = part.part
